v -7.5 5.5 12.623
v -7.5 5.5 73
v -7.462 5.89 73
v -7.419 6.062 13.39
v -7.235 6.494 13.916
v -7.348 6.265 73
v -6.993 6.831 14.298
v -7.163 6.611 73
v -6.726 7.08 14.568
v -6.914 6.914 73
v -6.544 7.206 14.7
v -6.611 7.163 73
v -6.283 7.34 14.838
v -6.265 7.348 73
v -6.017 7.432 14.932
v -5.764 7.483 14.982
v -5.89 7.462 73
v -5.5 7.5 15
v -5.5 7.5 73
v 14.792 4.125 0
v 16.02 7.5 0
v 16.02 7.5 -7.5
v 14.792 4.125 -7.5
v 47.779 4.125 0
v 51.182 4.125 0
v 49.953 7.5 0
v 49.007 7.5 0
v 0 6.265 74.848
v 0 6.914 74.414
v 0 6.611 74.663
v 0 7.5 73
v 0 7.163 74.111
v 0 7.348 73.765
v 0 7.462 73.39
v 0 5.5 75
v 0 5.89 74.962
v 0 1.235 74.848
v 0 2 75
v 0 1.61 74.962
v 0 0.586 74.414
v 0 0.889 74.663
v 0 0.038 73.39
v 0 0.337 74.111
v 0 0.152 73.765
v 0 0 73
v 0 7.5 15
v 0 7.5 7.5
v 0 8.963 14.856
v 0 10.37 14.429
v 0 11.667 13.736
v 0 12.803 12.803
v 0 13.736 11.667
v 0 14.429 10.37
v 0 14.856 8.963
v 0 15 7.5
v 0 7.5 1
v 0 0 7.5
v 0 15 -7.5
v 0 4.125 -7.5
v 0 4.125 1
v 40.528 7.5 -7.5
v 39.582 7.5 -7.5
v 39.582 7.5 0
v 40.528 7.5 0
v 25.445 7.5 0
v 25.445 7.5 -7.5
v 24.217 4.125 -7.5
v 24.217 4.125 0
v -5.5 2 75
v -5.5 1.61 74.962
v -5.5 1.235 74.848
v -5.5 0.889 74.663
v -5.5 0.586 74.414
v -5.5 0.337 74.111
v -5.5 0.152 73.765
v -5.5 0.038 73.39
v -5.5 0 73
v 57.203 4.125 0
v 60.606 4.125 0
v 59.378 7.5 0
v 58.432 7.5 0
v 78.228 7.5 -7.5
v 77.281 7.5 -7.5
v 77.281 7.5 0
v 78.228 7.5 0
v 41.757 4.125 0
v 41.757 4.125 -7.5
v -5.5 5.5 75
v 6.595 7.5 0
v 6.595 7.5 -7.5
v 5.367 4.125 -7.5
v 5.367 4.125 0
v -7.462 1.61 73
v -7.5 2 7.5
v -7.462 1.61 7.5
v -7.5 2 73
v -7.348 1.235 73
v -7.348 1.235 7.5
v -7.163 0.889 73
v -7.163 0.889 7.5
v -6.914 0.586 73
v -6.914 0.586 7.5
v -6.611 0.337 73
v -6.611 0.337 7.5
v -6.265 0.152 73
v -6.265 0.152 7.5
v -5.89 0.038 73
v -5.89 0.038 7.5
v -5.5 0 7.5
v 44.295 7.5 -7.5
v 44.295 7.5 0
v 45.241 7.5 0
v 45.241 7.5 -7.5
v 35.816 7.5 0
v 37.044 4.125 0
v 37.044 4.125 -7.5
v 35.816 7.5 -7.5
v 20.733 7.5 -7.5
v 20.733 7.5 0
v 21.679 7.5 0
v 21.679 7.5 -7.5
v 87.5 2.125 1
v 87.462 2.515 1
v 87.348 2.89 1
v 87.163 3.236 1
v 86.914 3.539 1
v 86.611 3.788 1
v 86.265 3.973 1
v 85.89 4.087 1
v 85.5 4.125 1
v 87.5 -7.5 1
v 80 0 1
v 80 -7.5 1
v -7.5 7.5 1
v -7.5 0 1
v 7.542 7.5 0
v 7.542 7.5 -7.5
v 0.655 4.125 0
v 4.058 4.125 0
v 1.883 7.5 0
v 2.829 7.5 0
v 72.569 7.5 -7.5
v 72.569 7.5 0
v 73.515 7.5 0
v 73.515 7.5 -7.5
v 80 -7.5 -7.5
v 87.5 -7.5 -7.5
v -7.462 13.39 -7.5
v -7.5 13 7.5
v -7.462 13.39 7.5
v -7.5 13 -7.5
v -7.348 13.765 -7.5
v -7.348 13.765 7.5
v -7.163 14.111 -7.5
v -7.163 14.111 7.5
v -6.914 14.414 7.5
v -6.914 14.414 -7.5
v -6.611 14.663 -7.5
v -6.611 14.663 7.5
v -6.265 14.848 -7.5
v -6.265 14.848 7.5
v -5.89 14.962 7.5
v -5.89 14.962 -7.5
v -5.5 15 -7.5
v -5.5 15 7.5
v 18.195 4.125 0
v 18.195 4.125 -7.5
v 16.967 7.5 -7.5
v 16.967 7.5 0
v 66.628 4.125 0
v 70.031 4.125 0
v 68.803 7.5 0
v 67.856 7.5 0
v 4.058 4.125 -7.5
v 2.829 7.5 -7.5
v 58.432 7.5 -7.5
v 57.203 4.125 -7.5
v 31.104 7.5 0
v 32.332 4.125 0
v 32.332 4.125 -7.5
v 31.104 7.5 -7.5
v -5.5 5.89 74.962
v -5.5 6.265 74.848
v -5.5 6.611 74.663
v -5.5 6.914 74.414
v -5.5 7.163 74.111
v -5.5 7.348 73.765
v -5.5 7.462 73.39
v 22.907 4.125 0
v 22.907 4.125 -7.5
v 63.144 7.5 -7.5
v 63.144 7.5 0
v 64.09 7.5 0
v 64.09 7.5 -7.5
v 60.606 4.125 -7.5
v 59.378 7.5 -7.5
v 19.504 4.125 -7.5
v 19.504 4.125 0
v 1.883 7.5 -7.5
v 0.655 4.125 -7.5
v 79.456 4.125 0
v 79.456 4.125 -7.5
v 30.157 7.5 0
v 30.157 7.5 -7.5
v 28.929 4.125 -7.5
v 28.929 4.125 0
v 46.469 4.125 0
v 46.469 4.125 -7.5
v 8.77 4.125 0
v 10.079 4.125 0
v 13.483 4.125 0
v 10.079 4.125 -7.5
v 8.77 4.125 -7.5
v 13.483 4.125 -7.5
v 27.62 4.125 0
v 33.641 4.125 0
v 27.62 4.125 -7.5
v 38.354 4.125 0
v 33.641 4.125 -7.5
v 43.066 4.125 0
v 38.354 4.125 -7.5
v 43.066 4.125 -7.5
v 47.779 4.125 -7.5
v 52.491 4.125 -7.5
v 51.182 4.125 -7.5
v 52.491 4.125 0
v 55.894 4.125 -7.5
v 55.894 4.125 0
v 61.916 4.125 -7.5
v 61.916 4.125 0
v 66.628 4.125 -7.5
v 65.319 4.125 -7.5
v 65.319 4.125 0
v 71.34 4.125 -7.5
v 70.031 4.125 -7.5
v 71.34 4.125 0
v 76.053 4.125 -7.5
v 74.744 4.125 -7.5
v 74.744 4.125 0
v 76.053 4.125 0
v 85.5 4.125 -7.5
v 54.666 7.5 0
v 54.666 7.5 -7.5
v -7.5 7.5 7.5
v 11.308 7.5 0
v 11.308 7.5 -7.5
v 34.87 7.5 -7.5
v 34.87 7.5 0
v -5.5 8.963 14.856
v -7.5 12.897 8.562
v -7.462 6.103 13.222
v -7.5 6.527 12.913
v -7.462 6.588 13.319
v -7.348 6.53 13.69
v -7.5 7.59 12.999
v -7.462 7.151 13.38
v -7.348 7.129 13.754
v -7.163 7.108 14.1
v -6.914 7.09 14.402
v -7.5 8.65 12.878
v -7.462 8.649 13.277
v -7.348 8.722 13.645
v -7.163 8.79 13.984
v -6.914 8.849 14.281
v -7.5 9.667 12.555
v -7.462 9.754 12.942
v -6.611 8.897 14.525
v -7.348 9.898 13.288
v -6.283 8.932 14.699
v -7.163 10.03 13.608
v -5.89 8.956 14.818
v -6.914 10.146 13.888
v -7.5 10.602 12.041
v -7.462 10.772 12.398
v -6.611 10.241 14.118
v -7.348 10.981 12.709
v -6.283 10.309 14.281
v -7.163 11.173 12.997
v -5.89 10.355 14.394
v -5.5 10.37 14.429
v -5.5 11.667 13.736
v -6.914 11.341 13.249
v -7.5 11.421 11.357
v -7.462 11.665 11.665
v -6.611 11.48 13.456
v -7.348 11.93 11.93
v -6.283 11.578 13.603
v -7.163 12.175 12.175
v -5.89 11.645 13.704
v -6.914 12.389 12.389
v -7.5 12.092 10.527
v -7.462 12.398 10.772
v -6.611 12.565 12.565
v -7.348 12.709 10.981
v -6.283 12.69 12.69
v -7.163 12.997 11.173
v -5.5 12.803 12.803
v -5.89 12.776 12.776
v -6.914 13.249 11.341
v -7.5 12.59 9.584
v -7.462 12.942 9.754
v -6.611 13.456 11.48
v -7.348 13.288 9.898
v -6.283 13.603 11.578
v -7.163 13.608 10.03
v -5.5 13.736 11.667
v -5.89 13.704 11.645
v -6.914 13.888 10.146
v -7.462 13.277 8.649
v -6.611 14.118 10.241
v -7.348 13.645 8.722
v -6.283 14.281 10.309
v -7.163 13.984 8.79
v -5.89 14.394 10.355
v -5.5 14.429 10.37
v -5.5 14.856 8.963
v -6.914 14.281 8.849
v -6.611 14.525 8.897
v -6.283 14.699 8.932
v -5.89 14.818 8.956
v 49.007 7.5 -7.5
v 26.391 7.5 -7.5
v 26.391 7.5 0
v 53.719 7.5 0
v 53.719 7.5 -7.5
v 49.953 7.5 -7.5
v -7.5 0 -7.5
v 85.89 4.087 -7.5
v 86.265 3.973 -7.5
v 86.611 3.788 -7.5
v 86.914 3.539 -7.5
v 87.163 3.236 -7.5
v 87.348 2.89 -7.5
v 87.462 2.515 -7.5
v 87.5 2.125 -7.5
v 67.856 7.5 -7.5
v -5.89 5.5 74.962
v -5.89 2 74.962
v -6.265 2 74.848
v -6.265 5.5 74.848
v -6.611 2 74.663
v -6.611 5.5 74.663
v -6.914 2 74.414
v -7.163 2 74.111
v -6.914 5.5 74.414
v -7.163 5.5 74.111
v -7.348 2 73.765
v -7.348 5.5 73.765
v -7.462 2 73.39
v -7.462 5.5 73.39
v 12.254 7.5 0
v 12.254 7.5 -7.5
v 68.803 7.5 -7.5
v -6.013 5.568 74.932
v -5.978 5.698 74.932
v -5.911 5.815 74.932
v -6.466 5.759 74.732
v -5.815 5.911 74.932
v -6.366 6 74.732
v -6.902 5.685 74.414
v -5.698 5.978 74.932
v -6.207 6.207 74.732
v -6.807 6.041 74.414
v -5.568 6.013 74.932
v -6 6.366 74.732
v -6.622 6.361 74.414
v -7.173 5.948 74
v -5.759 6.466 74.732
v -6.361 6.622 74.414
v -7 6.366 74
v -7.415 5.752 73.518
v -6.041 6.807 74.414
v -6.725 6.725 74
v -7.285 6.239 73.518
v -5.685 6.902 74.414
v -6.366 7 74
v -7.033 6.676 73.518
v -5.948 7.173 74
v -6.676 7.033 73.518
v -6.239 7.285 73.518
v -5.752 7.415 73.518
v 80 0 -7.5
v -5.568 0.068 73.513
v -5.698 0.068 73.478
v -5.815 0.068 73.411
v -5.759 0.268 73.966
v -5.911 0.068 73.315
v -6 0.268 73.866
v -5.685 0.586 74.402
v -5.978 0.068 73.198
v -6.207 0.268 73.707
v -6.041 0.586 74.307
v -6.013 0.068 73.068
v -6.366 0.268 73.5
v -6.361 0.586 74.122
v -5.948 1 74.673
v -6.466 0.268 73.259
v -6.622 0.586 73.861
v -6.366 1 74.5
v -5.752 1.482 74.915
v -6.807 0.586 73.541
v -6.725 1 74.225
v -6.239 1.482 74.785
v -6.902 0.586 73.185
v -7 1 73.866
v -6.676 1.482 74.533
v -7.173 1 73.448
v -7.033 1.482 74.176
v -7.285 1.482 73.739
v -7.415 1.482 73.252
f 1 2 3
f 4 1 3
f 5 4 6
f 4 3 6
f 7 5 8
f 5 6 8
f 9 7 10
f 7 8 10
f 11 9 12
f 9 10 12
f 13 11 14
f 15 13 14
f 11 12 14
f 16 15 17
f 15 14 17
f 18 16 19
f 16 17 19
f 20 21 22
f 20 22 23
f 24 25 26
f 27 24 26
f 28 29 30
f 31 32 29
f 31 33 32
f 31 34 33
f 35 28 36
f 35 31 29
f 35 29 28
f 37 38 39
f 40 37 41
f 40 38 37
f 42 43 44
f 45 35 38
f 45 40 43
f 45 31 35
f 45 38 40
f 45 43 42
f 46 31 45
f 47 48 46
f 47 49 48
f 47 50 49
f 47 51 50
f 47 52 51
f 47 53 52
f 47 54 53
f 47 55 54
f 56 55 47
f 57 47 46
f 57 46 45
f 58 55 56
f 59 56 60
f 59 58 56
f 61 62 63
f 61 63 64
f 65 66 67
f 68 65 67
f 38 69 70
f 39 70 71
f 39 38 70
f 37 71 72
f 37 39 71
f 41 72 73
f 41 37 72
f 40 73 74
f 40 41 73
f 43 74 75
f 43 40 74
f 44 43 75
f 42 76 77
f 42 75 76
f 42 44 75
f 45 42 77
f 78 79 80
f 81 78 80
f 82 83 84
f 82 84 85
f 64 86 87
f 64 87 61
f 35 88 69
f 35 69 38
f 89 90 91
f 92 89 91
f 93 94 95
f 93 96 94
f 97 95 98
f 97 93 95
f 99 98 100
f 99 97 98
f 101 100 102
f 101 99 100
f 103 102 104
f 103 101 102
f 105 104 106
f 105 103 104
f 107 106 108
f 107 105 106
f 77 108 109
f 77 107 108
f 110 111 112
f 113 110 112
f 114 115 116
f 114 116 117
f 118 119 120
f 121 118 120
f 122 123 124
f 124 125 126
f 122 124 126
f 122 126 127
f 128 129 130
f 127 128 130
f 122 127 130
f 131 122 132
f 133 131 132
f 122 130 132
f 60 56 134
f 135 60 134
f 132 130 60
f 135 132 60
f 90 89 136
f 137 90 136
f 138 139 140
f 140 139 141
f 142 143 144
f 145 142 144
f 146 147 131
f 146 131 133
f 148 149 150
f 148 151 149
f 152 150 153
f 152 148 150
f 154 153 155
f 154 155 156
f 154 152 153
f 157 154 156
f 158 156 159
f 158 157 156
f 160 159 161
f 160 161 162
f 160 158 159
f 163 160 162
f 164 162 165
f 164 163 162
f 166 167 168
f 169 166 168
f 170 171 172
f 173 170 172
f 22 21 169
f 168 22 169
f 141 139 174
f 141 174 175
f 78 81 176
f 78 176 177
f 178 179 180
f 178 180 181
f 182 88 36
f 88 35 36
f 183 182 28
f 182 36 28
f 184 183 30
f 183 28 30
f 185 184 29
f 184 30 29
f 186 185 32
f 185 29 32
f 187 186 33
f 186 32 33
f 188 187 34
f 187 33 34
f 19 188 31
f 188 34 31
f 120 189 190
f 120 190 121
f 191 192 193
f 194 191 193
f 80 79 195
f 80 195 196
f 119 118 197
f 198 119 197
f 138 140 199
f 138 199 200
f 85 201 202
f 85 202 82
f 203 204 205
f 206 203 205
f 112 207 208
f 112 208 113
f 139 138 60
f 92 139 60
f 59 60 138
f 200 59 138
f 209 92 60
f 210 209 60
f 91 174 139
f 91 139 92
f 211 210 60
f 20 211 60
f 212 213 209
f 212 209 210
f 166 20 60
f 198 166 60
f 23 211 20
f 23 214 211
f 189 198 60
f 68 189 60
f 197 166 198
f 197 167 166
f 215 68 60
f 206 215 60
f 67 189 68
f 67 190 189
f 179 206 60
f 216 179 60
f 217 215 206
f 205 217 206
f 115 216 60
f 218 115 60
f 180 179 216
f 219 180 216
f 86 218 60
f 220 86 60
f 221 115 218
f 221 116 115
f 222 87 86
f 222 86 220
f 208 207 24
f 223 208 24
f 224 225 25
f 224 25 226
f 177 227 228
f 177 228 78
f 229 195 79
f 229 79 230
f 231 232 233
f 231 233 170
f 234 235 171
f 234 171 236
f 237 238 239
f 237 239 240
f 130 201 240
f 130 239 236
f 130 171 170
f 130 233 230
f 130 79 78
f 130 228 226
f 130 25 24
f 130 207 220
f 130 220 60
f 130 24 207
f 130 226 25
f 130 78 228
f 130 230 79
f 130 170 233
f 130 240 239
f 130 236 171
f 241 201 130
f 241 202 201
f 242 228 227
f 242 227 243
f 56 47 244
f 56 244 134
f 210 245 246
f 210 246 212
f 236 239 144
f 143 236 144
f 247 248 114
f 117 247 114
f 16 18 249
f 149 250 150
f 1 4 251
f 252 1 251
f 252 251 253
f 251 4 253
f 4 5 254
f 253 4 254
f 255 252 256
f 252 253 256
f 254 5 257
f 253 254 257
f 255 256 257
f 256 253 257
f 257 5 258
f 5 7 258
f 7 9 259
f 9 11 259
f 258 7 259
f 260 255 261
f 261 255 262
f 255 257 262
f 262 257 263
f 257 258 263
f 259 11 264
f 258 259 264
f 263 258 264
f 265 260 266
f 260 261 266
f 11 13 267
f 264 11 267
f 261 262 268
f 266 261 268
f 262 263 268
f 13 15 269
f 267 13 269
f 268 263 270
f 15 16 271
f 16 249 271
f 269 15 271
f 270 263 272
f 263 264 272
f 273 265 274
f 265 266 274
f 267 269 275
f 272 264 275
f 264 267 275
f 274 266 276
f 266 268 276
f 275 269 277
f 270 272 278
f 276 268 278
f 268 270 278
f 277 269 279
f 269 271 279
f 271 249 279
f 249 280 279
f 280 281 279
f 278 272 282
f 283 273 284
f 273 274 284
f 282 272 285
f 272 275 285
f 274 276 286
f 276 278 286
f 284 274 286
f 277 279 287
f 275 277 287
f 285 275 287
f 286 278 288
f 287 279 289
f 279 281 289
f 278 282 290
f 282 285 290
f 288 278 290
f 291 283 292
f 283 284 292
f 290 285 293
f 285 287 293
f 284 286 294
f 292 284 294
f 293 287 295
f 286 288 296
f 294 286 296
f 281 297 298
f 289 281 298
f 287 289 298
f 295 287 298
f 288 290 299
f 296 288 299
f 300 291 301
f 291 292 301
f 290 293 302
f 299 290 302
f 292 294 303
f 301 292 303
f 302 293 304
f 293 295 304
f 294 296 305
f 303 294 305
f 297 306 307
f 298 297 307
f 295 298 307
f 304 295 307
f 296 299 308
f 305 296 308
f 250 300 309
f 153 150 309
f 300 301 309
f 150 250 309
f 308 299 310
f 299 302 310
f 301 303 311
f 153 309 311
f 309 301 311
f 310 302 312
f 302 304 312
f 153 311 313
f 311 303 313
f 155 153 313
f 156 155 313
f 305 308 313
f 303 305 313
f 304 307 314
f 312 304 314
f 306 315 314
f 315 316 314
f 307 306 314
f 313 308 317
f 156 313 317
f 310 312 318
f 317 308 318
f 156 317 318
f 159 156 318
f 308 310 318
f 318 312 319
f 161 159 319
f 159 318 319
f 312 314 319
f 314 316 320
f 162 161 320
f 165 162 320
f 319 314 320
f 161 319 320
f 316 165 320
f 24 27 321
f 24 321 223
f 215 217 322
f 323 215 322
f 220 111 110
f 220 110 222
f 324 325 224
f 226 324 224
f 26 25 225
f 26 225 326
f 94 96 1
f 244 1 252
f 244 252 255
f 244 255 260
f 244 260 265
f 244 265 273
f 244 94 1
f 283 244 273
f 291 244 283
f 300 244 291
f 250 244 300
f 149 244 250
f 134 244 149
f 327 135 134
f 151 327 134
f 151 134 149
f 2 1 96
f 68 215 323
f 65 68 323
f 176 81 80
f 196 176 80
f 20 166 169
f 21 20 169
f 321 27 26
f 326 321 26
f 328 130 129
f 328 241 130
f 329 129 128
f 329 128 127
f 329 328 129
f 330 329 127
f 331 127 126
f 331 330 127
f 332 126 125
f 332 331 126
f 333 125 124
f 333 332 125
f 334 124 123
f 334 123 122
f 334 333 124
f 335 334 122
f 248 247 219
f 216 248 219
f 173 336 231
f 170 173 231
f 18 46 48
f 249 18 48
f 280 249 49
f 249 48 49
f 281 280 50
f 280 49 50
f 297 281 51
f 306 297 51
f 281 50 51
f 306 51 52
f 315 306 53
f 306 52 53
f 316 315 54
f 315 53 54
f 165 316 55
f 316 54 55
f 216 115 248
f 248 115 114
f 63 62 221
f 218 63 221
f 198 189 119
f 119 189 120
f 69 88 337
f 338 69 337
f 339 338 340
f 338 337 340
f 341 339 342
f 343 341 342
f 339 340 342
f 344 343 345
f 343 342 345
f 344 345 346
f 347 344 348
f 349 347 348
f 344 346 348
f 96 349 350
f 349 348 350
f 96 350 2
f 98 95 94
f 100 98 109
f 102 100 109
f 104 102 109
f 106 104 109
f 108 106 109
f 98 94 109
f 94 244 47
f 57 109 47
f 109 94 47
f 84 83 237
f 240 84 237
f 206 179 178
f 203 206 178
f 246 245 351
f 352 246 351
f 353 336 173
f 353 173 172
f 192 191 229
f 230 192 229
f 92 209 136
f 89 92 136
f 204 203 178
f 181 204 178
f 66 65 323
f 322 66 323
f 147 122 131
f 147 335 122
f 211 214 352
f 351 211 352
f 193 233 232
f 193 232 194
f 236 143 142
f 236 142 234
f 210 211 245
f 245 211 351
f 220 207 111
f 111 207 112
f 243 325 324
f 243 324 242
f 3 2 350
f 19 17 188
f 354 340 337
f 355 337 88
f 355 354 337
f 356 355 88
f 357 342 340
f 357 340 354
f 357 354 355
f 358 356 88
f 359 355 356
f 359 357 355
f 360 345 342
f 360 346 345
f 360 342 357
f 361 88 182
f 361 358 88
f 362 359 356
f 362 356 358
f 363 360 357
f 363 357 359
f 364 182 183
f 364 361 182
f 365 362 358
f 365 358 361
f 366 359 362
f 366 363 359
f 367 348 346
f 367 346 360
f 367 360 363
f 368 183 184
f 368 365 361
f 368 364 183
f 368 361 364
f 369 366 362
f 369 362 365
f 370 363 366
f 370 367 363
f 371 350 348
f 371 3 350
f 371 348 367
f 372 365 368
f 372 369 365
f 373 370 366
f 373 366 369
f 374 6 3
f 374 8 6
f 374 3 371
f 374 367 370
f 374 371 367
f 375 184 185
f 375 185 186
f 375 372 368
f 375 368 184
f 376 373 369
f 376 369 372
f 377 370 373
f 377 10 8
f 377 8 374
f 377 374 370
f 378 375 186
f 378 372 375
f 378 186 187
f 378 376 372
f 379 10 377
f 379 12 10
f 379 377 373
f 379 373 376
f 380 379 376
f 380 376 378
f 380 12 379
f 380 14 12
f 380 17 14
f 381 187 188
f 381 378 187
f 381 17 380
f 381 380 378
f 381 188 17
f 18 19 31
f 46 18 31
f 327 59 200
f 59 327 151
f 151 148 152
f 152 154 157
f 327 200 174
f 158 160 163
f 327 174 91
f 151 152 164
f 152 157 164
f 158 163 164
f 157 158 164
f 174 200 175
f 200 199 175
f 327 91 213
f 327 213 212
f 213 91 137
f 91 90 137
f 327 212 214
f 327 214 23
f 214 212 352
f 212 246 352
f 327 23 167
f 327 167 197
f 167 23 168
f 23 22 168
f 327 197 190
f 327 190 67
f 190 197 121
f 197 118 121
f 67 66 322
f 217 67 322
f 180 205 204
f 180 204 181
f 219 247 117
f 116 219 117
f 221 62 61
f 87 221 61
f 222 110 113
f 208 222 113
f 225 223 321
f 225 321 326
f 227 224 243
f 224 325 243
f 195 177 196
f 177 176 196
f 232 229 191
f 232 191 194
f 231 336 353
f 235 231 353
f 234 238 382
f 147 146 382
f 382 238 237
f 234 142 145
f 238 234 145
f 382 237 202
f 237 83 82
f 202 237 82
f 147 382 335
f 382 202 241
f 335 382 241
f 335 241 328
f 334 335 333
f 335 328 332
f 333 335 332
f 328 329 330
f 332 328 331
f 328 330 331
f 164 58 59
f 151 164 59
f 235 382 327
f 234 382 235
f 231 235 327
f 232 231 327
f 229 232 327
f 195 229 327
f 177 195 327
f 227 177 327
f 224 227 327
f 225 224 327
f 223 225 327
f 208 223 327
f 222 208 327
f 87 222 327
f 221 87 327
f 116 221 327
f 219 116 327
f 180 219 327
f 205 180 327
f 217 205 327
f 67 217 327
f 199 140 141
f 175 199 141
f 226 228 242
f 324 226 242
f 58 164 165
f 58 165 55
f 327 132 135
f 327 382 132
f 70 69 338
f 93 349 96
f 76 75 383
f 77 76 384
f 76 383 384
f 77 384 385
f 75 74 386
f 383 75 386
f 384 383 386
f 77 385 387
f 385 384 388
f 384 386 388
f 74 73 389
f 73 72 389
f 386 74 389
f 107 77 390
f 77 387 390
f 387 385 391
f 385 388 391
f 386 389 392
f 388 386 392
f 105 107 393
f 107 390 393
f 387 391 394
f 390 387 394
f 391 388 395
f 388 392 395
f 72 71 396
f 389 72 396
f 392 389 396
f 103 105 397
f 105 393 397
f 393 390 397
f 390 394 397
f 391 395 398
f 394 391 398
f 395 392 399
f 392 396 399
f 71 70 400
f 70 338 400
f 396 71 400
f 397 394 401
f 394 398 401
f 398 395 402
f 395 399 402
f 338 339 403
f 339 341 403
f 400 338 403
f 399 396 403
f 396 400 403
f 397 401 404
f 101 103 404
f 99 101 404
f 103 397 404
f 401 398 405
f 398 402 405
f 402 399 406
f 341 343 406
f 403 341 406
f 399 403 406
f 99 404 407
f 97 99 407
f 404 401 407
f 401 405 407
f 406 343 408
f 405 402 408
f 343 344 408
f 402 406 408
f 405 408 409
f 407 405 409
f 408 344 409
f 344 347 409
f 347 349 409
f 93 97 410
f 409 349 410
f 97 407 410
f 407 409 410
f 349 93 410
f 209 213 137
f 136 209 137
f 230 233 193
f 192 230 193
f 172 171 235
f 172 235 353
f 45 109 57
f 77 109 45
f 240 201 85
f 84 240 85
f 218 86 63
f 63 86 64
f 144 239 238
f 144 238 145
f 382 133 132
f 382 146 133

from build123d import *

# Parameters (mm, degrees)
BLANKSKE_W              = 80
BLANKSKE_H              = 7.5
BLANK_DEPTH             = 20
TOOTHCUTSIM_DEPTH       = 83.802475808
TEETHCUTS_COUNT         = 18
TEETHCUTS_PITCH         = 4.712388975
SKETCH1_W               = 20
SKETCH1_H               = 11.625
BOSS_EXTRUDE2_DEPTH     = 7.5
SKETCH3_W               = 20
SKETCH3_H               = 15
BOSS_EXTRUDE3_DEPTH     = 7.5
SKETCH4_W               = 7.5
SKETCH4_H               = 15
BOSS_EXTRUDE4_DEPTH     = 15
SKETCH8_W               = 7.5
SKETCH8_H               = 7.5
CUT_EXTRUDE1_DEPTH      = 15
CUT_EXTRUDE2_DEPTH      = 15
SKETCH10_W              = 7.5
SKETCH10_H              = 7.5
BOSS_EXTRUDE5_DEPTH     = 7.5
SKETCH11_W              = 7.5
SKETCH11_H              = 15
BOSS_EXTRUDE7_DEPTH     = 60
CUT_EXTRUDE4_DEPTH      = 116.829144109
CUT_EXTRUDE4_DEPTH_BACK = 116.829144109
SKETCH12_W              = 95
SKETCH12_H              = 10
SKETCH14_W              = 95
SKETCH14_H              = 2.5
CUT_EXTRUDE5_DEPTH      = 100
SKETCH15_W              = 67.5
SKETCH15_H              = 7.5
CUT_EXTRUDE6_DEPTH      = 122.963109177
BOSS_EXTRUDE8_START     = -7.5
BOSS_EXTRUDE8_DEPTH     = 7.5
BOSS_EXTRUDE9_DEPTH     = 1
FILLET1_R               = 2
FILLET2_R               = 2
FILLET3_R               = 2


with BuildPart() as part:
    # BlankSke → Blank (new body)
    with BuildSketch(Plane.XY):
        with Locations((40, 3.75)):
            Rectangle(BLANKSKE_W, BLANKSKE_H)
    extrude(amount=-BLANK_DEPTH)

    # TooCutSkeSim → ToothCutSim (cut, through all)
    with BuildSketch(Plane.XY):
        Polygon((0.654653055, 4.125), (-0.654653055, 4.125), (-1.892297439, 7.5254), (1.892297439, 7.5254), align=None)
    toothcutsim = extrude(amount=-TOOTHCUTSIM_DEPTH, mode=Mode.SUBTRACT)

    # TeethCuts: ToothCutSim ×18
    with Locations(*[(i * TEETHCUTS_PITCH, 0, 0) for i in range(1, TEETHCUTS_COUNT)]):
        add(toothcutsim, mode=Mode.SUBTRACT)

    # Sketch1 → Boss-Extrude2 (add)
    with BuildSketch(Plane(origin=(80, 0, 0), x_dir=(0, 0, -1), z_dir=(1, 0, 0))):
        with Locations((10, -1.6875)):
            Rectangle(SKETCH1_W, SKETCH1_H)
    extrude(amount=BOSS_EXTRUDE2_DEPTH)

    # Sketch3 → Boss-Extrude3 (add)
    with BuildSketch(Plane.ZY):
        with Locations((-10, 7.5)):
            Rectangle(SKETCH3_W, SKETCH3_H)
    extrude(amount=BOSS_EXTRUDE3_DEPTH)

    # Sketch4 → Boss-Extrude4 (add)
    with BuildSketch(Plane.XY):
        with Locations((-3.75, 7.5)):
            Rectangle(SKETCH4_W, SKETCH4_H)
    extrude(amount=BOSS_EXTRUDE4_DEPTH)

    # Sketch8 → Cut-Extrude1 (cut)
    with BuildSketch(Plane(origin=(0, 0, 0), x_dir=(0, 0, -1), z_dir=(1, 0, 0))):
        with Locations((-3.75, 3.75)):
            Rectangle(SKETCH8_W, SKETCH8_H)
    extrude(amount=-CUT_EXTRUDE1_DEPTH, mode=Mode.SUBTRACT)

    # Sketch9 → Cut-Extrude2 (cut)
    with BuildSketch(Plane.ZY.offset(7.5)):
        Polygon((7.5, 15), (15, 7.5), (15, 15), align=None)
    extrude(amount=-CUT_EXTRUDE2_DEPTH, mode=Mode.SUBTRACT)

    # Sketch10 → Boss-Extrude5 (add)
    with BuildSketch(Plane.XZ):
        with Locations((-3.75, 11.25)):
            Rectangle(SKETCH10_W, SKETCH10_H)
    extrude(amount=BOSS_EXTRUDE5_DEPTH)

    # Sketch11 → Boss-Extrude7 (add)
    with BuildSketch(Plane.XY.offset(15)):
        with Locations((-3.75, 0)):
            Rectangle(SKETCH11_W, SKETCH11_H)
    extrude(amount=BOSS_EXTRUDE7_DEPTH)

    # Sketch12 → Cut-Extrude4 (cut, two sides: drawn at the far end of the back side and taken through both)
    with BuildSketch(Plane(origin=(0, 4.125, 0), x_dir=(1, 0, 0), z_dir=(0, 1, 0)).offset(-CUT_EXTRUDE4_DEPTH_BACK)):
        with Locations((40, 15)):
            Rectangle(SKETCH12_W, SKETCH12_H)
    extrude(amount=CUT_EXTRUDE4_DEPTH + CUT_EXTRUDE4_DEPTH_BACK, mode=Mode.SUBTRACT)

    # Sketch14 → Cut-Extrude5 (cut)
    with BuildSketch(Plane(origin=(0, 15, 0), x_dir=(1, 0, 0), z_dir=(0, 1, 0))):
        with Locations((40, 8.75)):
            Rectangle(SKETCH14_W, SKETCH14_H)
    extrude(amount=-CUT_EXTRUDE5_DEPTH, mode=Mode.SUBTRACT)

    # Sketch15 → Cut-Extrude6 (cut, through all)
    with BuildSketch(Plane.ZY.offset(7.5)):
        with Locations((41.25, -3.75)):
            Rectangle(SKETCH15_W, SKETCH15_H)
    extrude(amount=-CUT_EXTRUDE6_DEPTH, mode=Mode.SUBTRACT)

    # Sketch16 → Boss-Extrude8 (add)
    with BuildSketch(Plane.ZY.offset(7.5).offset(BOSS_EXTRUDE8_START)):
        with BuildLine():
            ThreePointArc((15, 7.5), (12.803300859, 12.803300859), (7.5, 15))
            Line((7.5, 15), (15, 7.5))
        make_face()
    extrude(amount=BOSS_EXTRUDE8_DEPTH)

    # Sketch19 → Boss-Extrude9 (add)
    with BuildSketch(Plane.XY):
        Polygon((-7.5, 0), (-7.5, 7.5), (0, 7.5), (0, 4.125), (87.5, 4.125), (87.5, -7.5), (80, -7.5), (80, 0), align=None)
    extrude(amount=BOSS_EXTRUDE9_DEPTH)

    # Fillet1
    fillet1_edges = [part.edges().sort_by_distance(p)[0] for p in [
        (-7.5, 15, 0),
        (-7.5, 7.5, 45),
        (-7.5, 12.803300859, 12.803300859),
    ]]
    fillet(fillet1_edges, radius=FILLET1_R)

    # Fillet2
    fillet2_edges = [part.edges().sort_by_distance(p)[0] for p in [
        (-2.75, 7.5, 75),
        (-3.75, 0, 75),
        (-7.5, 0, 41.25),
        (-7.5, 2.75, 75),
        (-6.914213562, 6.914213562, 75),
    ]]
    fillet(fillet2_edges, radius=FILLET2_R)

    # Fillet3
    fillet3_edges = [part.edges().sort_by_distance(p)[0] for p in [
        (87.5, 4.125, -3.25),
    ]]
    fillet(fillet3_edges, radius=FILLET3_R)


solid = part.part
